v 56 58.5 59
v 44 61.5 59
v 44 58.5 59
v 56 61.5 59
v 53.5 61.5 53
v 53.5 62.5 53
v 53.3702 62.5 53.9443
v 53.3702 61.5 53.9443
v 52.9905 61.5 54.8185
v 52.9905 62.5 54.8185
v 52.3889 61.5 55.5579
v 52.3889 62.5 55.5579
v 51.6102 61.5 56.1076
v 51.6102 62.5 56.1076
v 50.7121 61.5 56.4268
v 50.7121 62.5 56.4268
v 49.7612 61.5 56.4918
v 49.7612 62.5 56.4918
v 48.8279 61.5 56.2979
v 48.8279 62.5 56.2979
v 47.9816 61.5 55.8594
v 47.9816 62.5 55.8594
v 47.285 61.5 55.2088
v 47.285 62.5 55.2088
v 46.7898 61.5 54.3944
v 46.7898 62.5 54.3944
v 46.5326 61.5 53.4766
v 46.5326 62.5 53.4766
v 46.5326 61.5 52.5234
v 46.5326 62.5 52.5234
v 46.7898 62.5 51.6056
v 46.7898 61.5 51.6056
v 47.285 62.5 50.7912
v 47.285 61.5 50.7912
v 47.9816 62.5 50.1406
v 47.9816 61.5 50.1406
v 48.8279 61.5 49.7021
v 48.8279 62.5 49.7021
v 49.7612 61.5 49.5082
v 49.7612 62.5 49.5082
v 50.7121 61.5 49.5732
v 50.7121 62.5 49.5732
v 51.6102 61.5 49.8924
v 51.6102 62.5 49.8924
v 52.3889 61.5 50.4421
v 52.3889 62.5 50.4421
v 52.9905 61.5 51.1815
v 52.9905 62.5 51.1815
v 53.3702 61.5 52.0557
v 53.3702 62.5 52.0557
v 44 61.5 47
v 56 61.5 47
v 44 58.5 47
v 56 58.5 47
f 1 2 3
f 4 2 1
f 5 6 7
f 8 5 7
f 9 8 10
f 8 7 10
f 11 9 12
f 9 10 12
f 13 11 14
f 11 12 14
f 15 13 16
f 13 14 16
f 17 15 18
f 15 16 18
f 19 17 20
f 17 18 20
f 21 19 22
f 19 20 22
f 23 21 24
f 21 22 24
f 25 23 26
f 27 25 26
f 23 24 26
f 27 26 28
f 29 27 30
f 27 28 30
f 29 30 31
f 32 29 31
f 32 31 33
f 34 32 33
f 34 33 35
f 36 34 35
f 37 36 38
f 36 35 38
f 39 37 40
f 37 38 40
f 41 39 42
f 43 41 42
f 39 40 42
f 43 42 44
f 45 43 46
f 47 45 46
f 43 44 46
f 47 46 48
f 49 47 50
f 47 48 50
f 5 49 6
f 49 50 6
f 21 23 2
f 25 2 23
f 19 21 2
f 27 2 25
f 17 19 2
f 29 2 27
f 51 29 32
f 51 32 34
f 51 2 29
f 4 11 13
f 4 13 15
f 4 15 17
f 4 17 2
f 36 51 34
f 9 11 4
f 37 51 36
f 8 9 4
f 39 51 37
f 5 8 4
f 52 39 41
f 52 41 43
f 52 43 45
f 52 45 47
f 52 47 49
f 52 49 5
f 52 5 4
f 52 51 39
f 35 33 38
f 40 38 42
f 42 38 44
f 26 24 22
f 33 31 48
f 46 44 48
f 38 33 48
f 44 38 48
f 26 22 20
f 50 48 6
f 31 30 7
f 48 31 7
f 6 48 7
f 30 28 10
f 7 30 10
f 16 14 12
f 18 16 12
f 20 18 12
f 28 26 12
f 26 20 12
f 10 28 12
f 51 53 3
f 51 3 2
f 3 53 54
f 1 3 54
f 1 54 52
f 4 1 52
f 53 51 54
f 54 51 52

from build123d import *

# Parameters (mm, degrees)
BOX076_W               = 12
BOX076_H               = 3
BOX076_DEPTH           = 12
CYLINDER042_R          = 3.5
CYLINDER042_DEPTH      = 1
CYLINDER042_ROLL_ANGLE = 90


with BuildPart() as cube075:
    # Box076 → Box076 (new body)
    with BuildSketch(Plane(origin=(0, 71, 0), x_dir=(1, 0, 0), z_dir=(0, 0, 1))):
        with Locations((6, 1.5)):
            Rectangle(BOX076_W, BOX076_H)
    extrude(amount=BOX076_DEPTH)


with BuildPart() as microinterruptor:
    # Cylinder042 → Cylinder042 (new body)
    with BuildSketch(Plane.XY):
        Circle(CYLINDER042_R)
    extrude(amount=CYLINDER042_DEPTH)


with BuildPart() as microinterruptor_1:
    # Cylinder042 roll: moved
    add(microinterruptor.part.rotate(Axis((0, 0, 0), (1, 0, 0)), CYLINDER042_ROLL_ANGLE))


with BuildPart() as microinterruptor_2:
    # Cylinder042 placement: moved
    add(microinterruptor_1.part.moved(Location((6, 75, 6))))

    # Fusion024: union Cube075
    add(cube075.part)


with BuildPart() as microinterruptor_3:
    # Fusion024 placement: moved
    add(microinterruptor_2.part.moved(Location((44, -12.5, 47))))


solid = microinterruptor_3.part
